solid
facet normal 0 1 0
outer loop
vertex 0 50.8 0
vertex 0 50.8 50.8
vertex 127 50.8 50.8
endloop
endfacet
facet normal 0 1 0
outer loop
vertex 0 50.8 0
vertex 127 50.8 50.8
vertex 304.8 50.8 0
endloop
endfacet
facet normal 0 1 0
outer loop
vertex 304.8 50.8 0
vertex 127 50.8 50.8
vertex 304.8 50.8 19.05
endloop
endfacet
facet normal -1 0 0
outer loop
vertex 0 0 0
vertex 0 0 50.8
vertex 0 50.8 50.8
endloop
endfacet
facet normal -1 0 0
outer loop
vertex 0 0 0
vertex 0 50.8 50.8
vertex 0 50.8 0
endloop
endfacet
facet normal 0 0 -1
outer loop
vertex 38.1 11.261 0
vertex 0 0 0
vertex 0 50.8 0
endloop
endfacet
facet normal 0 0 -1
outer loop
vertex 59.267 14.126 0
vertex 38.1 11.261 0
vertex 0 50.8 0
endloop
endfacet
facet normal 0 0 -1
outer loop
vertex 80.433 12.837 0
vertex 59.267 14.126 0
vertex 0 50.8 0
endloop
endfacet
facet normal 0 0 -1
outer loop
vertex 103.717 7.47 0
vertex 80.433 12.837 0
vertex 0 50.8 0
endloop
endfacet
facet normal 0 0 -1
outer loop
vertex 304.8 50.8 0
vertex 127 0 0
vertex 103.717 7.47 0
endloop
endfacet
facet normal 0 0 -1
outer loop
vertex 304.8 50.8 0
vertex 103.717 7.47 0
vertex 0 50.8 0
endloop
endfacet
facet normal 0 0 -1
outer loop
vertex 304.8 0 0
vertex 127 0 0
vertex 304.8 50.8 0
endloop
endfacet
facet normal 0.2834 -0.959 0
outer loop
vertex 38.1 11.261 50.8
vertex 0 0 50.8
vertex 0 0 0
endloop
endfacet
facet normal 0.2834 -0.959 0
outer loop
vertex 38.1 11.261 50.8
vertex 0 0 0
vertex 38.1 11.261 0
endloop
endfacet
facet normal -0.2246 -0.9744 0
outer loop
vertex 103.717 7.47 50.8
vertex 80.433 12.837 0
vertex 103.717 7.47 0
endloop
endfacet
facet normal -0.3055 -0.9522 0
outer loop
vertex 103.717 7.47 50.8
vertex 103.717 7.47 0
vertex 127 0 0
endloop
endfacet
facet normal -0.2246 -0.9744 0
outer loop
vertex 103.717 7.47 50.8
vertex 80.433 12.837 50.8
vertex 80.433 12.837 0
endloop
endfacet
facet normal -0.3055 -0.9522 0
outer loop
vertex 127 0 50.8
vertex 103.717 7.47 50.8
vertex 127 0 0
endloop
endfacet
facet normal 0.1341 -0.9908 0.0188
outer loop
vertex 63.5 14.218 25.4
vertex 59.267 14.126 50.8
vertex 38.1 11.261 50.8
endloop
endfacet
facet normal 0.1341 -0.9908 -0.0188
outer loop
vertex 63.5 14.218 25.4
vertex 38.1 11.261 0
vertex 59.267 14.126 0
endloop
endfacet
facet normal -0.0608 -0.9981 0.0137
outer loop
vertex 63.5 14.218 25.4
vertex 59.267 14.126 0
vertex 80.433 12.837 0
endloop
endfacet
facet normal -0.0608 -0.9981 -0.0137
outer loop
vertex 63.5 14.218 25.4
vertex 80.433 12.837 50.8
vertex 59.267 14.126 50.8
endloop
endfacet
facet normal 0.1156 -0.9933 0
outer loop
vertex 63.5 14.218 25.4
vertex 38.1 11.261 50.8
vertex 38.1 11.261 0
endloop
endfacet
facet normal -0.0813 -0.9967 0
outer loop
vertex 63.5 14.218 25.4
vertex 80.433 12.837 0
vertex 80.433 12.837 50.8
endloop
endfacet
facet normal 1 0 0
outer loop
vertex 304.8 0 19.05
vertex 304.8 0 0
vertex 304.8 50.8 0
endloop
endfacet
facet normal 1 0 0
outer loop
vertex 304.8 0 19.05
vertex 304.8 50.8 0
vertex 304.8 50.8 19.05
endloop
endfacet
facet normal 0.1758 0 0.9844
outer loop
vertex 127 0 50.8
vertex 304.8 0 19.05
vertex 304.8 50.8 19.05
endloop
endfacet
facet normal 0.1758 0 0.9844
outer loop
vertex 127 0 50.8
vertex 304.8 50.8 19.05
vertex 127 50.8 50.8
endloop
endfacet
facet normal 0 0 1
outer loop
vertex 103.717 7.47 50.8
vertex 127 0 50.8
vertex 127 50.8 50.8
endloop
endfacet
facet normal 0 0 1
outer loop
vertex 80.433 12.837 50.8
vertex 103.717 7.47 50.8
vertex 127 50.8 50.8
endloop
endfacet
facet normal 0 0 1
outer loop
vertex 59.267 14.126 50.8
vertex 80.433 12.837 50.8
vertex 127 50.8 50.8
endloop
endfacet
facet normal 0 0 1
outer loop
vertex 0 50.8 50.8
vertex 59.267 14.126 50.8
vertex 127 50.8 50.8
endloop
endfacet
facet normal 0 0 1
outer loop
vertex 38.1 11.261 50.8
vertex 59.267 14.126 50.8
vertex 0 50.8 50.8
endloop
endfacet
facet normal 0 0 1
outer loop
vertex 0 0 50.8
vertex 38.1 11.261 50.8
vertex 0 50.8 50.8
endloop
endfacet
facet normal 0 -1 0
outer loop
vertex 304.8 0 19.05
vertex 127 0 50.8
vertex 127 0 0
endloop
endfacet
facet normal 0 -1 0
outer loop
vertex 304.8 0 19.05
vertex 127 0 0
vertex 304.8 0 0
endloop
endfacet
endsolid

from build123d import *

# Parameters (mm, degrees)
F1_DEPTH = 50.8
F3_DEPTH = 50.8


with BuildPart() as f1:
    # F0 (on Front) → F1 (new body)
    with BuildSketch(Plane.XZ):
        Polygon((0, 50.8), (0, 0), (304.8, 0), (304.8, 19.05), (127, 50.8), align=None)
    extrude(amount=-F1_DEPTH)

    # F2 (on face) → F3 (cut)
    with BuildSketch(Plane.XY.offset(50.8)):
        with BuildLine():
            add(Edge.make_bspline(
                [(0, 0), (21.1666666667, 7.1091600694), (63.5, 21.3274802081), (105.8333333333, 7.1091600694), (127, 0)],
                knots=[0, 0, 0, 0, 0.5, 1, 1, 1, 1], degree=3))
            Line((0, 0), (127, 0))
        make_face()
    extrude(amount=-F3_DEPTH, mode=Mode.SUBTRACT)


solid = f1.part
